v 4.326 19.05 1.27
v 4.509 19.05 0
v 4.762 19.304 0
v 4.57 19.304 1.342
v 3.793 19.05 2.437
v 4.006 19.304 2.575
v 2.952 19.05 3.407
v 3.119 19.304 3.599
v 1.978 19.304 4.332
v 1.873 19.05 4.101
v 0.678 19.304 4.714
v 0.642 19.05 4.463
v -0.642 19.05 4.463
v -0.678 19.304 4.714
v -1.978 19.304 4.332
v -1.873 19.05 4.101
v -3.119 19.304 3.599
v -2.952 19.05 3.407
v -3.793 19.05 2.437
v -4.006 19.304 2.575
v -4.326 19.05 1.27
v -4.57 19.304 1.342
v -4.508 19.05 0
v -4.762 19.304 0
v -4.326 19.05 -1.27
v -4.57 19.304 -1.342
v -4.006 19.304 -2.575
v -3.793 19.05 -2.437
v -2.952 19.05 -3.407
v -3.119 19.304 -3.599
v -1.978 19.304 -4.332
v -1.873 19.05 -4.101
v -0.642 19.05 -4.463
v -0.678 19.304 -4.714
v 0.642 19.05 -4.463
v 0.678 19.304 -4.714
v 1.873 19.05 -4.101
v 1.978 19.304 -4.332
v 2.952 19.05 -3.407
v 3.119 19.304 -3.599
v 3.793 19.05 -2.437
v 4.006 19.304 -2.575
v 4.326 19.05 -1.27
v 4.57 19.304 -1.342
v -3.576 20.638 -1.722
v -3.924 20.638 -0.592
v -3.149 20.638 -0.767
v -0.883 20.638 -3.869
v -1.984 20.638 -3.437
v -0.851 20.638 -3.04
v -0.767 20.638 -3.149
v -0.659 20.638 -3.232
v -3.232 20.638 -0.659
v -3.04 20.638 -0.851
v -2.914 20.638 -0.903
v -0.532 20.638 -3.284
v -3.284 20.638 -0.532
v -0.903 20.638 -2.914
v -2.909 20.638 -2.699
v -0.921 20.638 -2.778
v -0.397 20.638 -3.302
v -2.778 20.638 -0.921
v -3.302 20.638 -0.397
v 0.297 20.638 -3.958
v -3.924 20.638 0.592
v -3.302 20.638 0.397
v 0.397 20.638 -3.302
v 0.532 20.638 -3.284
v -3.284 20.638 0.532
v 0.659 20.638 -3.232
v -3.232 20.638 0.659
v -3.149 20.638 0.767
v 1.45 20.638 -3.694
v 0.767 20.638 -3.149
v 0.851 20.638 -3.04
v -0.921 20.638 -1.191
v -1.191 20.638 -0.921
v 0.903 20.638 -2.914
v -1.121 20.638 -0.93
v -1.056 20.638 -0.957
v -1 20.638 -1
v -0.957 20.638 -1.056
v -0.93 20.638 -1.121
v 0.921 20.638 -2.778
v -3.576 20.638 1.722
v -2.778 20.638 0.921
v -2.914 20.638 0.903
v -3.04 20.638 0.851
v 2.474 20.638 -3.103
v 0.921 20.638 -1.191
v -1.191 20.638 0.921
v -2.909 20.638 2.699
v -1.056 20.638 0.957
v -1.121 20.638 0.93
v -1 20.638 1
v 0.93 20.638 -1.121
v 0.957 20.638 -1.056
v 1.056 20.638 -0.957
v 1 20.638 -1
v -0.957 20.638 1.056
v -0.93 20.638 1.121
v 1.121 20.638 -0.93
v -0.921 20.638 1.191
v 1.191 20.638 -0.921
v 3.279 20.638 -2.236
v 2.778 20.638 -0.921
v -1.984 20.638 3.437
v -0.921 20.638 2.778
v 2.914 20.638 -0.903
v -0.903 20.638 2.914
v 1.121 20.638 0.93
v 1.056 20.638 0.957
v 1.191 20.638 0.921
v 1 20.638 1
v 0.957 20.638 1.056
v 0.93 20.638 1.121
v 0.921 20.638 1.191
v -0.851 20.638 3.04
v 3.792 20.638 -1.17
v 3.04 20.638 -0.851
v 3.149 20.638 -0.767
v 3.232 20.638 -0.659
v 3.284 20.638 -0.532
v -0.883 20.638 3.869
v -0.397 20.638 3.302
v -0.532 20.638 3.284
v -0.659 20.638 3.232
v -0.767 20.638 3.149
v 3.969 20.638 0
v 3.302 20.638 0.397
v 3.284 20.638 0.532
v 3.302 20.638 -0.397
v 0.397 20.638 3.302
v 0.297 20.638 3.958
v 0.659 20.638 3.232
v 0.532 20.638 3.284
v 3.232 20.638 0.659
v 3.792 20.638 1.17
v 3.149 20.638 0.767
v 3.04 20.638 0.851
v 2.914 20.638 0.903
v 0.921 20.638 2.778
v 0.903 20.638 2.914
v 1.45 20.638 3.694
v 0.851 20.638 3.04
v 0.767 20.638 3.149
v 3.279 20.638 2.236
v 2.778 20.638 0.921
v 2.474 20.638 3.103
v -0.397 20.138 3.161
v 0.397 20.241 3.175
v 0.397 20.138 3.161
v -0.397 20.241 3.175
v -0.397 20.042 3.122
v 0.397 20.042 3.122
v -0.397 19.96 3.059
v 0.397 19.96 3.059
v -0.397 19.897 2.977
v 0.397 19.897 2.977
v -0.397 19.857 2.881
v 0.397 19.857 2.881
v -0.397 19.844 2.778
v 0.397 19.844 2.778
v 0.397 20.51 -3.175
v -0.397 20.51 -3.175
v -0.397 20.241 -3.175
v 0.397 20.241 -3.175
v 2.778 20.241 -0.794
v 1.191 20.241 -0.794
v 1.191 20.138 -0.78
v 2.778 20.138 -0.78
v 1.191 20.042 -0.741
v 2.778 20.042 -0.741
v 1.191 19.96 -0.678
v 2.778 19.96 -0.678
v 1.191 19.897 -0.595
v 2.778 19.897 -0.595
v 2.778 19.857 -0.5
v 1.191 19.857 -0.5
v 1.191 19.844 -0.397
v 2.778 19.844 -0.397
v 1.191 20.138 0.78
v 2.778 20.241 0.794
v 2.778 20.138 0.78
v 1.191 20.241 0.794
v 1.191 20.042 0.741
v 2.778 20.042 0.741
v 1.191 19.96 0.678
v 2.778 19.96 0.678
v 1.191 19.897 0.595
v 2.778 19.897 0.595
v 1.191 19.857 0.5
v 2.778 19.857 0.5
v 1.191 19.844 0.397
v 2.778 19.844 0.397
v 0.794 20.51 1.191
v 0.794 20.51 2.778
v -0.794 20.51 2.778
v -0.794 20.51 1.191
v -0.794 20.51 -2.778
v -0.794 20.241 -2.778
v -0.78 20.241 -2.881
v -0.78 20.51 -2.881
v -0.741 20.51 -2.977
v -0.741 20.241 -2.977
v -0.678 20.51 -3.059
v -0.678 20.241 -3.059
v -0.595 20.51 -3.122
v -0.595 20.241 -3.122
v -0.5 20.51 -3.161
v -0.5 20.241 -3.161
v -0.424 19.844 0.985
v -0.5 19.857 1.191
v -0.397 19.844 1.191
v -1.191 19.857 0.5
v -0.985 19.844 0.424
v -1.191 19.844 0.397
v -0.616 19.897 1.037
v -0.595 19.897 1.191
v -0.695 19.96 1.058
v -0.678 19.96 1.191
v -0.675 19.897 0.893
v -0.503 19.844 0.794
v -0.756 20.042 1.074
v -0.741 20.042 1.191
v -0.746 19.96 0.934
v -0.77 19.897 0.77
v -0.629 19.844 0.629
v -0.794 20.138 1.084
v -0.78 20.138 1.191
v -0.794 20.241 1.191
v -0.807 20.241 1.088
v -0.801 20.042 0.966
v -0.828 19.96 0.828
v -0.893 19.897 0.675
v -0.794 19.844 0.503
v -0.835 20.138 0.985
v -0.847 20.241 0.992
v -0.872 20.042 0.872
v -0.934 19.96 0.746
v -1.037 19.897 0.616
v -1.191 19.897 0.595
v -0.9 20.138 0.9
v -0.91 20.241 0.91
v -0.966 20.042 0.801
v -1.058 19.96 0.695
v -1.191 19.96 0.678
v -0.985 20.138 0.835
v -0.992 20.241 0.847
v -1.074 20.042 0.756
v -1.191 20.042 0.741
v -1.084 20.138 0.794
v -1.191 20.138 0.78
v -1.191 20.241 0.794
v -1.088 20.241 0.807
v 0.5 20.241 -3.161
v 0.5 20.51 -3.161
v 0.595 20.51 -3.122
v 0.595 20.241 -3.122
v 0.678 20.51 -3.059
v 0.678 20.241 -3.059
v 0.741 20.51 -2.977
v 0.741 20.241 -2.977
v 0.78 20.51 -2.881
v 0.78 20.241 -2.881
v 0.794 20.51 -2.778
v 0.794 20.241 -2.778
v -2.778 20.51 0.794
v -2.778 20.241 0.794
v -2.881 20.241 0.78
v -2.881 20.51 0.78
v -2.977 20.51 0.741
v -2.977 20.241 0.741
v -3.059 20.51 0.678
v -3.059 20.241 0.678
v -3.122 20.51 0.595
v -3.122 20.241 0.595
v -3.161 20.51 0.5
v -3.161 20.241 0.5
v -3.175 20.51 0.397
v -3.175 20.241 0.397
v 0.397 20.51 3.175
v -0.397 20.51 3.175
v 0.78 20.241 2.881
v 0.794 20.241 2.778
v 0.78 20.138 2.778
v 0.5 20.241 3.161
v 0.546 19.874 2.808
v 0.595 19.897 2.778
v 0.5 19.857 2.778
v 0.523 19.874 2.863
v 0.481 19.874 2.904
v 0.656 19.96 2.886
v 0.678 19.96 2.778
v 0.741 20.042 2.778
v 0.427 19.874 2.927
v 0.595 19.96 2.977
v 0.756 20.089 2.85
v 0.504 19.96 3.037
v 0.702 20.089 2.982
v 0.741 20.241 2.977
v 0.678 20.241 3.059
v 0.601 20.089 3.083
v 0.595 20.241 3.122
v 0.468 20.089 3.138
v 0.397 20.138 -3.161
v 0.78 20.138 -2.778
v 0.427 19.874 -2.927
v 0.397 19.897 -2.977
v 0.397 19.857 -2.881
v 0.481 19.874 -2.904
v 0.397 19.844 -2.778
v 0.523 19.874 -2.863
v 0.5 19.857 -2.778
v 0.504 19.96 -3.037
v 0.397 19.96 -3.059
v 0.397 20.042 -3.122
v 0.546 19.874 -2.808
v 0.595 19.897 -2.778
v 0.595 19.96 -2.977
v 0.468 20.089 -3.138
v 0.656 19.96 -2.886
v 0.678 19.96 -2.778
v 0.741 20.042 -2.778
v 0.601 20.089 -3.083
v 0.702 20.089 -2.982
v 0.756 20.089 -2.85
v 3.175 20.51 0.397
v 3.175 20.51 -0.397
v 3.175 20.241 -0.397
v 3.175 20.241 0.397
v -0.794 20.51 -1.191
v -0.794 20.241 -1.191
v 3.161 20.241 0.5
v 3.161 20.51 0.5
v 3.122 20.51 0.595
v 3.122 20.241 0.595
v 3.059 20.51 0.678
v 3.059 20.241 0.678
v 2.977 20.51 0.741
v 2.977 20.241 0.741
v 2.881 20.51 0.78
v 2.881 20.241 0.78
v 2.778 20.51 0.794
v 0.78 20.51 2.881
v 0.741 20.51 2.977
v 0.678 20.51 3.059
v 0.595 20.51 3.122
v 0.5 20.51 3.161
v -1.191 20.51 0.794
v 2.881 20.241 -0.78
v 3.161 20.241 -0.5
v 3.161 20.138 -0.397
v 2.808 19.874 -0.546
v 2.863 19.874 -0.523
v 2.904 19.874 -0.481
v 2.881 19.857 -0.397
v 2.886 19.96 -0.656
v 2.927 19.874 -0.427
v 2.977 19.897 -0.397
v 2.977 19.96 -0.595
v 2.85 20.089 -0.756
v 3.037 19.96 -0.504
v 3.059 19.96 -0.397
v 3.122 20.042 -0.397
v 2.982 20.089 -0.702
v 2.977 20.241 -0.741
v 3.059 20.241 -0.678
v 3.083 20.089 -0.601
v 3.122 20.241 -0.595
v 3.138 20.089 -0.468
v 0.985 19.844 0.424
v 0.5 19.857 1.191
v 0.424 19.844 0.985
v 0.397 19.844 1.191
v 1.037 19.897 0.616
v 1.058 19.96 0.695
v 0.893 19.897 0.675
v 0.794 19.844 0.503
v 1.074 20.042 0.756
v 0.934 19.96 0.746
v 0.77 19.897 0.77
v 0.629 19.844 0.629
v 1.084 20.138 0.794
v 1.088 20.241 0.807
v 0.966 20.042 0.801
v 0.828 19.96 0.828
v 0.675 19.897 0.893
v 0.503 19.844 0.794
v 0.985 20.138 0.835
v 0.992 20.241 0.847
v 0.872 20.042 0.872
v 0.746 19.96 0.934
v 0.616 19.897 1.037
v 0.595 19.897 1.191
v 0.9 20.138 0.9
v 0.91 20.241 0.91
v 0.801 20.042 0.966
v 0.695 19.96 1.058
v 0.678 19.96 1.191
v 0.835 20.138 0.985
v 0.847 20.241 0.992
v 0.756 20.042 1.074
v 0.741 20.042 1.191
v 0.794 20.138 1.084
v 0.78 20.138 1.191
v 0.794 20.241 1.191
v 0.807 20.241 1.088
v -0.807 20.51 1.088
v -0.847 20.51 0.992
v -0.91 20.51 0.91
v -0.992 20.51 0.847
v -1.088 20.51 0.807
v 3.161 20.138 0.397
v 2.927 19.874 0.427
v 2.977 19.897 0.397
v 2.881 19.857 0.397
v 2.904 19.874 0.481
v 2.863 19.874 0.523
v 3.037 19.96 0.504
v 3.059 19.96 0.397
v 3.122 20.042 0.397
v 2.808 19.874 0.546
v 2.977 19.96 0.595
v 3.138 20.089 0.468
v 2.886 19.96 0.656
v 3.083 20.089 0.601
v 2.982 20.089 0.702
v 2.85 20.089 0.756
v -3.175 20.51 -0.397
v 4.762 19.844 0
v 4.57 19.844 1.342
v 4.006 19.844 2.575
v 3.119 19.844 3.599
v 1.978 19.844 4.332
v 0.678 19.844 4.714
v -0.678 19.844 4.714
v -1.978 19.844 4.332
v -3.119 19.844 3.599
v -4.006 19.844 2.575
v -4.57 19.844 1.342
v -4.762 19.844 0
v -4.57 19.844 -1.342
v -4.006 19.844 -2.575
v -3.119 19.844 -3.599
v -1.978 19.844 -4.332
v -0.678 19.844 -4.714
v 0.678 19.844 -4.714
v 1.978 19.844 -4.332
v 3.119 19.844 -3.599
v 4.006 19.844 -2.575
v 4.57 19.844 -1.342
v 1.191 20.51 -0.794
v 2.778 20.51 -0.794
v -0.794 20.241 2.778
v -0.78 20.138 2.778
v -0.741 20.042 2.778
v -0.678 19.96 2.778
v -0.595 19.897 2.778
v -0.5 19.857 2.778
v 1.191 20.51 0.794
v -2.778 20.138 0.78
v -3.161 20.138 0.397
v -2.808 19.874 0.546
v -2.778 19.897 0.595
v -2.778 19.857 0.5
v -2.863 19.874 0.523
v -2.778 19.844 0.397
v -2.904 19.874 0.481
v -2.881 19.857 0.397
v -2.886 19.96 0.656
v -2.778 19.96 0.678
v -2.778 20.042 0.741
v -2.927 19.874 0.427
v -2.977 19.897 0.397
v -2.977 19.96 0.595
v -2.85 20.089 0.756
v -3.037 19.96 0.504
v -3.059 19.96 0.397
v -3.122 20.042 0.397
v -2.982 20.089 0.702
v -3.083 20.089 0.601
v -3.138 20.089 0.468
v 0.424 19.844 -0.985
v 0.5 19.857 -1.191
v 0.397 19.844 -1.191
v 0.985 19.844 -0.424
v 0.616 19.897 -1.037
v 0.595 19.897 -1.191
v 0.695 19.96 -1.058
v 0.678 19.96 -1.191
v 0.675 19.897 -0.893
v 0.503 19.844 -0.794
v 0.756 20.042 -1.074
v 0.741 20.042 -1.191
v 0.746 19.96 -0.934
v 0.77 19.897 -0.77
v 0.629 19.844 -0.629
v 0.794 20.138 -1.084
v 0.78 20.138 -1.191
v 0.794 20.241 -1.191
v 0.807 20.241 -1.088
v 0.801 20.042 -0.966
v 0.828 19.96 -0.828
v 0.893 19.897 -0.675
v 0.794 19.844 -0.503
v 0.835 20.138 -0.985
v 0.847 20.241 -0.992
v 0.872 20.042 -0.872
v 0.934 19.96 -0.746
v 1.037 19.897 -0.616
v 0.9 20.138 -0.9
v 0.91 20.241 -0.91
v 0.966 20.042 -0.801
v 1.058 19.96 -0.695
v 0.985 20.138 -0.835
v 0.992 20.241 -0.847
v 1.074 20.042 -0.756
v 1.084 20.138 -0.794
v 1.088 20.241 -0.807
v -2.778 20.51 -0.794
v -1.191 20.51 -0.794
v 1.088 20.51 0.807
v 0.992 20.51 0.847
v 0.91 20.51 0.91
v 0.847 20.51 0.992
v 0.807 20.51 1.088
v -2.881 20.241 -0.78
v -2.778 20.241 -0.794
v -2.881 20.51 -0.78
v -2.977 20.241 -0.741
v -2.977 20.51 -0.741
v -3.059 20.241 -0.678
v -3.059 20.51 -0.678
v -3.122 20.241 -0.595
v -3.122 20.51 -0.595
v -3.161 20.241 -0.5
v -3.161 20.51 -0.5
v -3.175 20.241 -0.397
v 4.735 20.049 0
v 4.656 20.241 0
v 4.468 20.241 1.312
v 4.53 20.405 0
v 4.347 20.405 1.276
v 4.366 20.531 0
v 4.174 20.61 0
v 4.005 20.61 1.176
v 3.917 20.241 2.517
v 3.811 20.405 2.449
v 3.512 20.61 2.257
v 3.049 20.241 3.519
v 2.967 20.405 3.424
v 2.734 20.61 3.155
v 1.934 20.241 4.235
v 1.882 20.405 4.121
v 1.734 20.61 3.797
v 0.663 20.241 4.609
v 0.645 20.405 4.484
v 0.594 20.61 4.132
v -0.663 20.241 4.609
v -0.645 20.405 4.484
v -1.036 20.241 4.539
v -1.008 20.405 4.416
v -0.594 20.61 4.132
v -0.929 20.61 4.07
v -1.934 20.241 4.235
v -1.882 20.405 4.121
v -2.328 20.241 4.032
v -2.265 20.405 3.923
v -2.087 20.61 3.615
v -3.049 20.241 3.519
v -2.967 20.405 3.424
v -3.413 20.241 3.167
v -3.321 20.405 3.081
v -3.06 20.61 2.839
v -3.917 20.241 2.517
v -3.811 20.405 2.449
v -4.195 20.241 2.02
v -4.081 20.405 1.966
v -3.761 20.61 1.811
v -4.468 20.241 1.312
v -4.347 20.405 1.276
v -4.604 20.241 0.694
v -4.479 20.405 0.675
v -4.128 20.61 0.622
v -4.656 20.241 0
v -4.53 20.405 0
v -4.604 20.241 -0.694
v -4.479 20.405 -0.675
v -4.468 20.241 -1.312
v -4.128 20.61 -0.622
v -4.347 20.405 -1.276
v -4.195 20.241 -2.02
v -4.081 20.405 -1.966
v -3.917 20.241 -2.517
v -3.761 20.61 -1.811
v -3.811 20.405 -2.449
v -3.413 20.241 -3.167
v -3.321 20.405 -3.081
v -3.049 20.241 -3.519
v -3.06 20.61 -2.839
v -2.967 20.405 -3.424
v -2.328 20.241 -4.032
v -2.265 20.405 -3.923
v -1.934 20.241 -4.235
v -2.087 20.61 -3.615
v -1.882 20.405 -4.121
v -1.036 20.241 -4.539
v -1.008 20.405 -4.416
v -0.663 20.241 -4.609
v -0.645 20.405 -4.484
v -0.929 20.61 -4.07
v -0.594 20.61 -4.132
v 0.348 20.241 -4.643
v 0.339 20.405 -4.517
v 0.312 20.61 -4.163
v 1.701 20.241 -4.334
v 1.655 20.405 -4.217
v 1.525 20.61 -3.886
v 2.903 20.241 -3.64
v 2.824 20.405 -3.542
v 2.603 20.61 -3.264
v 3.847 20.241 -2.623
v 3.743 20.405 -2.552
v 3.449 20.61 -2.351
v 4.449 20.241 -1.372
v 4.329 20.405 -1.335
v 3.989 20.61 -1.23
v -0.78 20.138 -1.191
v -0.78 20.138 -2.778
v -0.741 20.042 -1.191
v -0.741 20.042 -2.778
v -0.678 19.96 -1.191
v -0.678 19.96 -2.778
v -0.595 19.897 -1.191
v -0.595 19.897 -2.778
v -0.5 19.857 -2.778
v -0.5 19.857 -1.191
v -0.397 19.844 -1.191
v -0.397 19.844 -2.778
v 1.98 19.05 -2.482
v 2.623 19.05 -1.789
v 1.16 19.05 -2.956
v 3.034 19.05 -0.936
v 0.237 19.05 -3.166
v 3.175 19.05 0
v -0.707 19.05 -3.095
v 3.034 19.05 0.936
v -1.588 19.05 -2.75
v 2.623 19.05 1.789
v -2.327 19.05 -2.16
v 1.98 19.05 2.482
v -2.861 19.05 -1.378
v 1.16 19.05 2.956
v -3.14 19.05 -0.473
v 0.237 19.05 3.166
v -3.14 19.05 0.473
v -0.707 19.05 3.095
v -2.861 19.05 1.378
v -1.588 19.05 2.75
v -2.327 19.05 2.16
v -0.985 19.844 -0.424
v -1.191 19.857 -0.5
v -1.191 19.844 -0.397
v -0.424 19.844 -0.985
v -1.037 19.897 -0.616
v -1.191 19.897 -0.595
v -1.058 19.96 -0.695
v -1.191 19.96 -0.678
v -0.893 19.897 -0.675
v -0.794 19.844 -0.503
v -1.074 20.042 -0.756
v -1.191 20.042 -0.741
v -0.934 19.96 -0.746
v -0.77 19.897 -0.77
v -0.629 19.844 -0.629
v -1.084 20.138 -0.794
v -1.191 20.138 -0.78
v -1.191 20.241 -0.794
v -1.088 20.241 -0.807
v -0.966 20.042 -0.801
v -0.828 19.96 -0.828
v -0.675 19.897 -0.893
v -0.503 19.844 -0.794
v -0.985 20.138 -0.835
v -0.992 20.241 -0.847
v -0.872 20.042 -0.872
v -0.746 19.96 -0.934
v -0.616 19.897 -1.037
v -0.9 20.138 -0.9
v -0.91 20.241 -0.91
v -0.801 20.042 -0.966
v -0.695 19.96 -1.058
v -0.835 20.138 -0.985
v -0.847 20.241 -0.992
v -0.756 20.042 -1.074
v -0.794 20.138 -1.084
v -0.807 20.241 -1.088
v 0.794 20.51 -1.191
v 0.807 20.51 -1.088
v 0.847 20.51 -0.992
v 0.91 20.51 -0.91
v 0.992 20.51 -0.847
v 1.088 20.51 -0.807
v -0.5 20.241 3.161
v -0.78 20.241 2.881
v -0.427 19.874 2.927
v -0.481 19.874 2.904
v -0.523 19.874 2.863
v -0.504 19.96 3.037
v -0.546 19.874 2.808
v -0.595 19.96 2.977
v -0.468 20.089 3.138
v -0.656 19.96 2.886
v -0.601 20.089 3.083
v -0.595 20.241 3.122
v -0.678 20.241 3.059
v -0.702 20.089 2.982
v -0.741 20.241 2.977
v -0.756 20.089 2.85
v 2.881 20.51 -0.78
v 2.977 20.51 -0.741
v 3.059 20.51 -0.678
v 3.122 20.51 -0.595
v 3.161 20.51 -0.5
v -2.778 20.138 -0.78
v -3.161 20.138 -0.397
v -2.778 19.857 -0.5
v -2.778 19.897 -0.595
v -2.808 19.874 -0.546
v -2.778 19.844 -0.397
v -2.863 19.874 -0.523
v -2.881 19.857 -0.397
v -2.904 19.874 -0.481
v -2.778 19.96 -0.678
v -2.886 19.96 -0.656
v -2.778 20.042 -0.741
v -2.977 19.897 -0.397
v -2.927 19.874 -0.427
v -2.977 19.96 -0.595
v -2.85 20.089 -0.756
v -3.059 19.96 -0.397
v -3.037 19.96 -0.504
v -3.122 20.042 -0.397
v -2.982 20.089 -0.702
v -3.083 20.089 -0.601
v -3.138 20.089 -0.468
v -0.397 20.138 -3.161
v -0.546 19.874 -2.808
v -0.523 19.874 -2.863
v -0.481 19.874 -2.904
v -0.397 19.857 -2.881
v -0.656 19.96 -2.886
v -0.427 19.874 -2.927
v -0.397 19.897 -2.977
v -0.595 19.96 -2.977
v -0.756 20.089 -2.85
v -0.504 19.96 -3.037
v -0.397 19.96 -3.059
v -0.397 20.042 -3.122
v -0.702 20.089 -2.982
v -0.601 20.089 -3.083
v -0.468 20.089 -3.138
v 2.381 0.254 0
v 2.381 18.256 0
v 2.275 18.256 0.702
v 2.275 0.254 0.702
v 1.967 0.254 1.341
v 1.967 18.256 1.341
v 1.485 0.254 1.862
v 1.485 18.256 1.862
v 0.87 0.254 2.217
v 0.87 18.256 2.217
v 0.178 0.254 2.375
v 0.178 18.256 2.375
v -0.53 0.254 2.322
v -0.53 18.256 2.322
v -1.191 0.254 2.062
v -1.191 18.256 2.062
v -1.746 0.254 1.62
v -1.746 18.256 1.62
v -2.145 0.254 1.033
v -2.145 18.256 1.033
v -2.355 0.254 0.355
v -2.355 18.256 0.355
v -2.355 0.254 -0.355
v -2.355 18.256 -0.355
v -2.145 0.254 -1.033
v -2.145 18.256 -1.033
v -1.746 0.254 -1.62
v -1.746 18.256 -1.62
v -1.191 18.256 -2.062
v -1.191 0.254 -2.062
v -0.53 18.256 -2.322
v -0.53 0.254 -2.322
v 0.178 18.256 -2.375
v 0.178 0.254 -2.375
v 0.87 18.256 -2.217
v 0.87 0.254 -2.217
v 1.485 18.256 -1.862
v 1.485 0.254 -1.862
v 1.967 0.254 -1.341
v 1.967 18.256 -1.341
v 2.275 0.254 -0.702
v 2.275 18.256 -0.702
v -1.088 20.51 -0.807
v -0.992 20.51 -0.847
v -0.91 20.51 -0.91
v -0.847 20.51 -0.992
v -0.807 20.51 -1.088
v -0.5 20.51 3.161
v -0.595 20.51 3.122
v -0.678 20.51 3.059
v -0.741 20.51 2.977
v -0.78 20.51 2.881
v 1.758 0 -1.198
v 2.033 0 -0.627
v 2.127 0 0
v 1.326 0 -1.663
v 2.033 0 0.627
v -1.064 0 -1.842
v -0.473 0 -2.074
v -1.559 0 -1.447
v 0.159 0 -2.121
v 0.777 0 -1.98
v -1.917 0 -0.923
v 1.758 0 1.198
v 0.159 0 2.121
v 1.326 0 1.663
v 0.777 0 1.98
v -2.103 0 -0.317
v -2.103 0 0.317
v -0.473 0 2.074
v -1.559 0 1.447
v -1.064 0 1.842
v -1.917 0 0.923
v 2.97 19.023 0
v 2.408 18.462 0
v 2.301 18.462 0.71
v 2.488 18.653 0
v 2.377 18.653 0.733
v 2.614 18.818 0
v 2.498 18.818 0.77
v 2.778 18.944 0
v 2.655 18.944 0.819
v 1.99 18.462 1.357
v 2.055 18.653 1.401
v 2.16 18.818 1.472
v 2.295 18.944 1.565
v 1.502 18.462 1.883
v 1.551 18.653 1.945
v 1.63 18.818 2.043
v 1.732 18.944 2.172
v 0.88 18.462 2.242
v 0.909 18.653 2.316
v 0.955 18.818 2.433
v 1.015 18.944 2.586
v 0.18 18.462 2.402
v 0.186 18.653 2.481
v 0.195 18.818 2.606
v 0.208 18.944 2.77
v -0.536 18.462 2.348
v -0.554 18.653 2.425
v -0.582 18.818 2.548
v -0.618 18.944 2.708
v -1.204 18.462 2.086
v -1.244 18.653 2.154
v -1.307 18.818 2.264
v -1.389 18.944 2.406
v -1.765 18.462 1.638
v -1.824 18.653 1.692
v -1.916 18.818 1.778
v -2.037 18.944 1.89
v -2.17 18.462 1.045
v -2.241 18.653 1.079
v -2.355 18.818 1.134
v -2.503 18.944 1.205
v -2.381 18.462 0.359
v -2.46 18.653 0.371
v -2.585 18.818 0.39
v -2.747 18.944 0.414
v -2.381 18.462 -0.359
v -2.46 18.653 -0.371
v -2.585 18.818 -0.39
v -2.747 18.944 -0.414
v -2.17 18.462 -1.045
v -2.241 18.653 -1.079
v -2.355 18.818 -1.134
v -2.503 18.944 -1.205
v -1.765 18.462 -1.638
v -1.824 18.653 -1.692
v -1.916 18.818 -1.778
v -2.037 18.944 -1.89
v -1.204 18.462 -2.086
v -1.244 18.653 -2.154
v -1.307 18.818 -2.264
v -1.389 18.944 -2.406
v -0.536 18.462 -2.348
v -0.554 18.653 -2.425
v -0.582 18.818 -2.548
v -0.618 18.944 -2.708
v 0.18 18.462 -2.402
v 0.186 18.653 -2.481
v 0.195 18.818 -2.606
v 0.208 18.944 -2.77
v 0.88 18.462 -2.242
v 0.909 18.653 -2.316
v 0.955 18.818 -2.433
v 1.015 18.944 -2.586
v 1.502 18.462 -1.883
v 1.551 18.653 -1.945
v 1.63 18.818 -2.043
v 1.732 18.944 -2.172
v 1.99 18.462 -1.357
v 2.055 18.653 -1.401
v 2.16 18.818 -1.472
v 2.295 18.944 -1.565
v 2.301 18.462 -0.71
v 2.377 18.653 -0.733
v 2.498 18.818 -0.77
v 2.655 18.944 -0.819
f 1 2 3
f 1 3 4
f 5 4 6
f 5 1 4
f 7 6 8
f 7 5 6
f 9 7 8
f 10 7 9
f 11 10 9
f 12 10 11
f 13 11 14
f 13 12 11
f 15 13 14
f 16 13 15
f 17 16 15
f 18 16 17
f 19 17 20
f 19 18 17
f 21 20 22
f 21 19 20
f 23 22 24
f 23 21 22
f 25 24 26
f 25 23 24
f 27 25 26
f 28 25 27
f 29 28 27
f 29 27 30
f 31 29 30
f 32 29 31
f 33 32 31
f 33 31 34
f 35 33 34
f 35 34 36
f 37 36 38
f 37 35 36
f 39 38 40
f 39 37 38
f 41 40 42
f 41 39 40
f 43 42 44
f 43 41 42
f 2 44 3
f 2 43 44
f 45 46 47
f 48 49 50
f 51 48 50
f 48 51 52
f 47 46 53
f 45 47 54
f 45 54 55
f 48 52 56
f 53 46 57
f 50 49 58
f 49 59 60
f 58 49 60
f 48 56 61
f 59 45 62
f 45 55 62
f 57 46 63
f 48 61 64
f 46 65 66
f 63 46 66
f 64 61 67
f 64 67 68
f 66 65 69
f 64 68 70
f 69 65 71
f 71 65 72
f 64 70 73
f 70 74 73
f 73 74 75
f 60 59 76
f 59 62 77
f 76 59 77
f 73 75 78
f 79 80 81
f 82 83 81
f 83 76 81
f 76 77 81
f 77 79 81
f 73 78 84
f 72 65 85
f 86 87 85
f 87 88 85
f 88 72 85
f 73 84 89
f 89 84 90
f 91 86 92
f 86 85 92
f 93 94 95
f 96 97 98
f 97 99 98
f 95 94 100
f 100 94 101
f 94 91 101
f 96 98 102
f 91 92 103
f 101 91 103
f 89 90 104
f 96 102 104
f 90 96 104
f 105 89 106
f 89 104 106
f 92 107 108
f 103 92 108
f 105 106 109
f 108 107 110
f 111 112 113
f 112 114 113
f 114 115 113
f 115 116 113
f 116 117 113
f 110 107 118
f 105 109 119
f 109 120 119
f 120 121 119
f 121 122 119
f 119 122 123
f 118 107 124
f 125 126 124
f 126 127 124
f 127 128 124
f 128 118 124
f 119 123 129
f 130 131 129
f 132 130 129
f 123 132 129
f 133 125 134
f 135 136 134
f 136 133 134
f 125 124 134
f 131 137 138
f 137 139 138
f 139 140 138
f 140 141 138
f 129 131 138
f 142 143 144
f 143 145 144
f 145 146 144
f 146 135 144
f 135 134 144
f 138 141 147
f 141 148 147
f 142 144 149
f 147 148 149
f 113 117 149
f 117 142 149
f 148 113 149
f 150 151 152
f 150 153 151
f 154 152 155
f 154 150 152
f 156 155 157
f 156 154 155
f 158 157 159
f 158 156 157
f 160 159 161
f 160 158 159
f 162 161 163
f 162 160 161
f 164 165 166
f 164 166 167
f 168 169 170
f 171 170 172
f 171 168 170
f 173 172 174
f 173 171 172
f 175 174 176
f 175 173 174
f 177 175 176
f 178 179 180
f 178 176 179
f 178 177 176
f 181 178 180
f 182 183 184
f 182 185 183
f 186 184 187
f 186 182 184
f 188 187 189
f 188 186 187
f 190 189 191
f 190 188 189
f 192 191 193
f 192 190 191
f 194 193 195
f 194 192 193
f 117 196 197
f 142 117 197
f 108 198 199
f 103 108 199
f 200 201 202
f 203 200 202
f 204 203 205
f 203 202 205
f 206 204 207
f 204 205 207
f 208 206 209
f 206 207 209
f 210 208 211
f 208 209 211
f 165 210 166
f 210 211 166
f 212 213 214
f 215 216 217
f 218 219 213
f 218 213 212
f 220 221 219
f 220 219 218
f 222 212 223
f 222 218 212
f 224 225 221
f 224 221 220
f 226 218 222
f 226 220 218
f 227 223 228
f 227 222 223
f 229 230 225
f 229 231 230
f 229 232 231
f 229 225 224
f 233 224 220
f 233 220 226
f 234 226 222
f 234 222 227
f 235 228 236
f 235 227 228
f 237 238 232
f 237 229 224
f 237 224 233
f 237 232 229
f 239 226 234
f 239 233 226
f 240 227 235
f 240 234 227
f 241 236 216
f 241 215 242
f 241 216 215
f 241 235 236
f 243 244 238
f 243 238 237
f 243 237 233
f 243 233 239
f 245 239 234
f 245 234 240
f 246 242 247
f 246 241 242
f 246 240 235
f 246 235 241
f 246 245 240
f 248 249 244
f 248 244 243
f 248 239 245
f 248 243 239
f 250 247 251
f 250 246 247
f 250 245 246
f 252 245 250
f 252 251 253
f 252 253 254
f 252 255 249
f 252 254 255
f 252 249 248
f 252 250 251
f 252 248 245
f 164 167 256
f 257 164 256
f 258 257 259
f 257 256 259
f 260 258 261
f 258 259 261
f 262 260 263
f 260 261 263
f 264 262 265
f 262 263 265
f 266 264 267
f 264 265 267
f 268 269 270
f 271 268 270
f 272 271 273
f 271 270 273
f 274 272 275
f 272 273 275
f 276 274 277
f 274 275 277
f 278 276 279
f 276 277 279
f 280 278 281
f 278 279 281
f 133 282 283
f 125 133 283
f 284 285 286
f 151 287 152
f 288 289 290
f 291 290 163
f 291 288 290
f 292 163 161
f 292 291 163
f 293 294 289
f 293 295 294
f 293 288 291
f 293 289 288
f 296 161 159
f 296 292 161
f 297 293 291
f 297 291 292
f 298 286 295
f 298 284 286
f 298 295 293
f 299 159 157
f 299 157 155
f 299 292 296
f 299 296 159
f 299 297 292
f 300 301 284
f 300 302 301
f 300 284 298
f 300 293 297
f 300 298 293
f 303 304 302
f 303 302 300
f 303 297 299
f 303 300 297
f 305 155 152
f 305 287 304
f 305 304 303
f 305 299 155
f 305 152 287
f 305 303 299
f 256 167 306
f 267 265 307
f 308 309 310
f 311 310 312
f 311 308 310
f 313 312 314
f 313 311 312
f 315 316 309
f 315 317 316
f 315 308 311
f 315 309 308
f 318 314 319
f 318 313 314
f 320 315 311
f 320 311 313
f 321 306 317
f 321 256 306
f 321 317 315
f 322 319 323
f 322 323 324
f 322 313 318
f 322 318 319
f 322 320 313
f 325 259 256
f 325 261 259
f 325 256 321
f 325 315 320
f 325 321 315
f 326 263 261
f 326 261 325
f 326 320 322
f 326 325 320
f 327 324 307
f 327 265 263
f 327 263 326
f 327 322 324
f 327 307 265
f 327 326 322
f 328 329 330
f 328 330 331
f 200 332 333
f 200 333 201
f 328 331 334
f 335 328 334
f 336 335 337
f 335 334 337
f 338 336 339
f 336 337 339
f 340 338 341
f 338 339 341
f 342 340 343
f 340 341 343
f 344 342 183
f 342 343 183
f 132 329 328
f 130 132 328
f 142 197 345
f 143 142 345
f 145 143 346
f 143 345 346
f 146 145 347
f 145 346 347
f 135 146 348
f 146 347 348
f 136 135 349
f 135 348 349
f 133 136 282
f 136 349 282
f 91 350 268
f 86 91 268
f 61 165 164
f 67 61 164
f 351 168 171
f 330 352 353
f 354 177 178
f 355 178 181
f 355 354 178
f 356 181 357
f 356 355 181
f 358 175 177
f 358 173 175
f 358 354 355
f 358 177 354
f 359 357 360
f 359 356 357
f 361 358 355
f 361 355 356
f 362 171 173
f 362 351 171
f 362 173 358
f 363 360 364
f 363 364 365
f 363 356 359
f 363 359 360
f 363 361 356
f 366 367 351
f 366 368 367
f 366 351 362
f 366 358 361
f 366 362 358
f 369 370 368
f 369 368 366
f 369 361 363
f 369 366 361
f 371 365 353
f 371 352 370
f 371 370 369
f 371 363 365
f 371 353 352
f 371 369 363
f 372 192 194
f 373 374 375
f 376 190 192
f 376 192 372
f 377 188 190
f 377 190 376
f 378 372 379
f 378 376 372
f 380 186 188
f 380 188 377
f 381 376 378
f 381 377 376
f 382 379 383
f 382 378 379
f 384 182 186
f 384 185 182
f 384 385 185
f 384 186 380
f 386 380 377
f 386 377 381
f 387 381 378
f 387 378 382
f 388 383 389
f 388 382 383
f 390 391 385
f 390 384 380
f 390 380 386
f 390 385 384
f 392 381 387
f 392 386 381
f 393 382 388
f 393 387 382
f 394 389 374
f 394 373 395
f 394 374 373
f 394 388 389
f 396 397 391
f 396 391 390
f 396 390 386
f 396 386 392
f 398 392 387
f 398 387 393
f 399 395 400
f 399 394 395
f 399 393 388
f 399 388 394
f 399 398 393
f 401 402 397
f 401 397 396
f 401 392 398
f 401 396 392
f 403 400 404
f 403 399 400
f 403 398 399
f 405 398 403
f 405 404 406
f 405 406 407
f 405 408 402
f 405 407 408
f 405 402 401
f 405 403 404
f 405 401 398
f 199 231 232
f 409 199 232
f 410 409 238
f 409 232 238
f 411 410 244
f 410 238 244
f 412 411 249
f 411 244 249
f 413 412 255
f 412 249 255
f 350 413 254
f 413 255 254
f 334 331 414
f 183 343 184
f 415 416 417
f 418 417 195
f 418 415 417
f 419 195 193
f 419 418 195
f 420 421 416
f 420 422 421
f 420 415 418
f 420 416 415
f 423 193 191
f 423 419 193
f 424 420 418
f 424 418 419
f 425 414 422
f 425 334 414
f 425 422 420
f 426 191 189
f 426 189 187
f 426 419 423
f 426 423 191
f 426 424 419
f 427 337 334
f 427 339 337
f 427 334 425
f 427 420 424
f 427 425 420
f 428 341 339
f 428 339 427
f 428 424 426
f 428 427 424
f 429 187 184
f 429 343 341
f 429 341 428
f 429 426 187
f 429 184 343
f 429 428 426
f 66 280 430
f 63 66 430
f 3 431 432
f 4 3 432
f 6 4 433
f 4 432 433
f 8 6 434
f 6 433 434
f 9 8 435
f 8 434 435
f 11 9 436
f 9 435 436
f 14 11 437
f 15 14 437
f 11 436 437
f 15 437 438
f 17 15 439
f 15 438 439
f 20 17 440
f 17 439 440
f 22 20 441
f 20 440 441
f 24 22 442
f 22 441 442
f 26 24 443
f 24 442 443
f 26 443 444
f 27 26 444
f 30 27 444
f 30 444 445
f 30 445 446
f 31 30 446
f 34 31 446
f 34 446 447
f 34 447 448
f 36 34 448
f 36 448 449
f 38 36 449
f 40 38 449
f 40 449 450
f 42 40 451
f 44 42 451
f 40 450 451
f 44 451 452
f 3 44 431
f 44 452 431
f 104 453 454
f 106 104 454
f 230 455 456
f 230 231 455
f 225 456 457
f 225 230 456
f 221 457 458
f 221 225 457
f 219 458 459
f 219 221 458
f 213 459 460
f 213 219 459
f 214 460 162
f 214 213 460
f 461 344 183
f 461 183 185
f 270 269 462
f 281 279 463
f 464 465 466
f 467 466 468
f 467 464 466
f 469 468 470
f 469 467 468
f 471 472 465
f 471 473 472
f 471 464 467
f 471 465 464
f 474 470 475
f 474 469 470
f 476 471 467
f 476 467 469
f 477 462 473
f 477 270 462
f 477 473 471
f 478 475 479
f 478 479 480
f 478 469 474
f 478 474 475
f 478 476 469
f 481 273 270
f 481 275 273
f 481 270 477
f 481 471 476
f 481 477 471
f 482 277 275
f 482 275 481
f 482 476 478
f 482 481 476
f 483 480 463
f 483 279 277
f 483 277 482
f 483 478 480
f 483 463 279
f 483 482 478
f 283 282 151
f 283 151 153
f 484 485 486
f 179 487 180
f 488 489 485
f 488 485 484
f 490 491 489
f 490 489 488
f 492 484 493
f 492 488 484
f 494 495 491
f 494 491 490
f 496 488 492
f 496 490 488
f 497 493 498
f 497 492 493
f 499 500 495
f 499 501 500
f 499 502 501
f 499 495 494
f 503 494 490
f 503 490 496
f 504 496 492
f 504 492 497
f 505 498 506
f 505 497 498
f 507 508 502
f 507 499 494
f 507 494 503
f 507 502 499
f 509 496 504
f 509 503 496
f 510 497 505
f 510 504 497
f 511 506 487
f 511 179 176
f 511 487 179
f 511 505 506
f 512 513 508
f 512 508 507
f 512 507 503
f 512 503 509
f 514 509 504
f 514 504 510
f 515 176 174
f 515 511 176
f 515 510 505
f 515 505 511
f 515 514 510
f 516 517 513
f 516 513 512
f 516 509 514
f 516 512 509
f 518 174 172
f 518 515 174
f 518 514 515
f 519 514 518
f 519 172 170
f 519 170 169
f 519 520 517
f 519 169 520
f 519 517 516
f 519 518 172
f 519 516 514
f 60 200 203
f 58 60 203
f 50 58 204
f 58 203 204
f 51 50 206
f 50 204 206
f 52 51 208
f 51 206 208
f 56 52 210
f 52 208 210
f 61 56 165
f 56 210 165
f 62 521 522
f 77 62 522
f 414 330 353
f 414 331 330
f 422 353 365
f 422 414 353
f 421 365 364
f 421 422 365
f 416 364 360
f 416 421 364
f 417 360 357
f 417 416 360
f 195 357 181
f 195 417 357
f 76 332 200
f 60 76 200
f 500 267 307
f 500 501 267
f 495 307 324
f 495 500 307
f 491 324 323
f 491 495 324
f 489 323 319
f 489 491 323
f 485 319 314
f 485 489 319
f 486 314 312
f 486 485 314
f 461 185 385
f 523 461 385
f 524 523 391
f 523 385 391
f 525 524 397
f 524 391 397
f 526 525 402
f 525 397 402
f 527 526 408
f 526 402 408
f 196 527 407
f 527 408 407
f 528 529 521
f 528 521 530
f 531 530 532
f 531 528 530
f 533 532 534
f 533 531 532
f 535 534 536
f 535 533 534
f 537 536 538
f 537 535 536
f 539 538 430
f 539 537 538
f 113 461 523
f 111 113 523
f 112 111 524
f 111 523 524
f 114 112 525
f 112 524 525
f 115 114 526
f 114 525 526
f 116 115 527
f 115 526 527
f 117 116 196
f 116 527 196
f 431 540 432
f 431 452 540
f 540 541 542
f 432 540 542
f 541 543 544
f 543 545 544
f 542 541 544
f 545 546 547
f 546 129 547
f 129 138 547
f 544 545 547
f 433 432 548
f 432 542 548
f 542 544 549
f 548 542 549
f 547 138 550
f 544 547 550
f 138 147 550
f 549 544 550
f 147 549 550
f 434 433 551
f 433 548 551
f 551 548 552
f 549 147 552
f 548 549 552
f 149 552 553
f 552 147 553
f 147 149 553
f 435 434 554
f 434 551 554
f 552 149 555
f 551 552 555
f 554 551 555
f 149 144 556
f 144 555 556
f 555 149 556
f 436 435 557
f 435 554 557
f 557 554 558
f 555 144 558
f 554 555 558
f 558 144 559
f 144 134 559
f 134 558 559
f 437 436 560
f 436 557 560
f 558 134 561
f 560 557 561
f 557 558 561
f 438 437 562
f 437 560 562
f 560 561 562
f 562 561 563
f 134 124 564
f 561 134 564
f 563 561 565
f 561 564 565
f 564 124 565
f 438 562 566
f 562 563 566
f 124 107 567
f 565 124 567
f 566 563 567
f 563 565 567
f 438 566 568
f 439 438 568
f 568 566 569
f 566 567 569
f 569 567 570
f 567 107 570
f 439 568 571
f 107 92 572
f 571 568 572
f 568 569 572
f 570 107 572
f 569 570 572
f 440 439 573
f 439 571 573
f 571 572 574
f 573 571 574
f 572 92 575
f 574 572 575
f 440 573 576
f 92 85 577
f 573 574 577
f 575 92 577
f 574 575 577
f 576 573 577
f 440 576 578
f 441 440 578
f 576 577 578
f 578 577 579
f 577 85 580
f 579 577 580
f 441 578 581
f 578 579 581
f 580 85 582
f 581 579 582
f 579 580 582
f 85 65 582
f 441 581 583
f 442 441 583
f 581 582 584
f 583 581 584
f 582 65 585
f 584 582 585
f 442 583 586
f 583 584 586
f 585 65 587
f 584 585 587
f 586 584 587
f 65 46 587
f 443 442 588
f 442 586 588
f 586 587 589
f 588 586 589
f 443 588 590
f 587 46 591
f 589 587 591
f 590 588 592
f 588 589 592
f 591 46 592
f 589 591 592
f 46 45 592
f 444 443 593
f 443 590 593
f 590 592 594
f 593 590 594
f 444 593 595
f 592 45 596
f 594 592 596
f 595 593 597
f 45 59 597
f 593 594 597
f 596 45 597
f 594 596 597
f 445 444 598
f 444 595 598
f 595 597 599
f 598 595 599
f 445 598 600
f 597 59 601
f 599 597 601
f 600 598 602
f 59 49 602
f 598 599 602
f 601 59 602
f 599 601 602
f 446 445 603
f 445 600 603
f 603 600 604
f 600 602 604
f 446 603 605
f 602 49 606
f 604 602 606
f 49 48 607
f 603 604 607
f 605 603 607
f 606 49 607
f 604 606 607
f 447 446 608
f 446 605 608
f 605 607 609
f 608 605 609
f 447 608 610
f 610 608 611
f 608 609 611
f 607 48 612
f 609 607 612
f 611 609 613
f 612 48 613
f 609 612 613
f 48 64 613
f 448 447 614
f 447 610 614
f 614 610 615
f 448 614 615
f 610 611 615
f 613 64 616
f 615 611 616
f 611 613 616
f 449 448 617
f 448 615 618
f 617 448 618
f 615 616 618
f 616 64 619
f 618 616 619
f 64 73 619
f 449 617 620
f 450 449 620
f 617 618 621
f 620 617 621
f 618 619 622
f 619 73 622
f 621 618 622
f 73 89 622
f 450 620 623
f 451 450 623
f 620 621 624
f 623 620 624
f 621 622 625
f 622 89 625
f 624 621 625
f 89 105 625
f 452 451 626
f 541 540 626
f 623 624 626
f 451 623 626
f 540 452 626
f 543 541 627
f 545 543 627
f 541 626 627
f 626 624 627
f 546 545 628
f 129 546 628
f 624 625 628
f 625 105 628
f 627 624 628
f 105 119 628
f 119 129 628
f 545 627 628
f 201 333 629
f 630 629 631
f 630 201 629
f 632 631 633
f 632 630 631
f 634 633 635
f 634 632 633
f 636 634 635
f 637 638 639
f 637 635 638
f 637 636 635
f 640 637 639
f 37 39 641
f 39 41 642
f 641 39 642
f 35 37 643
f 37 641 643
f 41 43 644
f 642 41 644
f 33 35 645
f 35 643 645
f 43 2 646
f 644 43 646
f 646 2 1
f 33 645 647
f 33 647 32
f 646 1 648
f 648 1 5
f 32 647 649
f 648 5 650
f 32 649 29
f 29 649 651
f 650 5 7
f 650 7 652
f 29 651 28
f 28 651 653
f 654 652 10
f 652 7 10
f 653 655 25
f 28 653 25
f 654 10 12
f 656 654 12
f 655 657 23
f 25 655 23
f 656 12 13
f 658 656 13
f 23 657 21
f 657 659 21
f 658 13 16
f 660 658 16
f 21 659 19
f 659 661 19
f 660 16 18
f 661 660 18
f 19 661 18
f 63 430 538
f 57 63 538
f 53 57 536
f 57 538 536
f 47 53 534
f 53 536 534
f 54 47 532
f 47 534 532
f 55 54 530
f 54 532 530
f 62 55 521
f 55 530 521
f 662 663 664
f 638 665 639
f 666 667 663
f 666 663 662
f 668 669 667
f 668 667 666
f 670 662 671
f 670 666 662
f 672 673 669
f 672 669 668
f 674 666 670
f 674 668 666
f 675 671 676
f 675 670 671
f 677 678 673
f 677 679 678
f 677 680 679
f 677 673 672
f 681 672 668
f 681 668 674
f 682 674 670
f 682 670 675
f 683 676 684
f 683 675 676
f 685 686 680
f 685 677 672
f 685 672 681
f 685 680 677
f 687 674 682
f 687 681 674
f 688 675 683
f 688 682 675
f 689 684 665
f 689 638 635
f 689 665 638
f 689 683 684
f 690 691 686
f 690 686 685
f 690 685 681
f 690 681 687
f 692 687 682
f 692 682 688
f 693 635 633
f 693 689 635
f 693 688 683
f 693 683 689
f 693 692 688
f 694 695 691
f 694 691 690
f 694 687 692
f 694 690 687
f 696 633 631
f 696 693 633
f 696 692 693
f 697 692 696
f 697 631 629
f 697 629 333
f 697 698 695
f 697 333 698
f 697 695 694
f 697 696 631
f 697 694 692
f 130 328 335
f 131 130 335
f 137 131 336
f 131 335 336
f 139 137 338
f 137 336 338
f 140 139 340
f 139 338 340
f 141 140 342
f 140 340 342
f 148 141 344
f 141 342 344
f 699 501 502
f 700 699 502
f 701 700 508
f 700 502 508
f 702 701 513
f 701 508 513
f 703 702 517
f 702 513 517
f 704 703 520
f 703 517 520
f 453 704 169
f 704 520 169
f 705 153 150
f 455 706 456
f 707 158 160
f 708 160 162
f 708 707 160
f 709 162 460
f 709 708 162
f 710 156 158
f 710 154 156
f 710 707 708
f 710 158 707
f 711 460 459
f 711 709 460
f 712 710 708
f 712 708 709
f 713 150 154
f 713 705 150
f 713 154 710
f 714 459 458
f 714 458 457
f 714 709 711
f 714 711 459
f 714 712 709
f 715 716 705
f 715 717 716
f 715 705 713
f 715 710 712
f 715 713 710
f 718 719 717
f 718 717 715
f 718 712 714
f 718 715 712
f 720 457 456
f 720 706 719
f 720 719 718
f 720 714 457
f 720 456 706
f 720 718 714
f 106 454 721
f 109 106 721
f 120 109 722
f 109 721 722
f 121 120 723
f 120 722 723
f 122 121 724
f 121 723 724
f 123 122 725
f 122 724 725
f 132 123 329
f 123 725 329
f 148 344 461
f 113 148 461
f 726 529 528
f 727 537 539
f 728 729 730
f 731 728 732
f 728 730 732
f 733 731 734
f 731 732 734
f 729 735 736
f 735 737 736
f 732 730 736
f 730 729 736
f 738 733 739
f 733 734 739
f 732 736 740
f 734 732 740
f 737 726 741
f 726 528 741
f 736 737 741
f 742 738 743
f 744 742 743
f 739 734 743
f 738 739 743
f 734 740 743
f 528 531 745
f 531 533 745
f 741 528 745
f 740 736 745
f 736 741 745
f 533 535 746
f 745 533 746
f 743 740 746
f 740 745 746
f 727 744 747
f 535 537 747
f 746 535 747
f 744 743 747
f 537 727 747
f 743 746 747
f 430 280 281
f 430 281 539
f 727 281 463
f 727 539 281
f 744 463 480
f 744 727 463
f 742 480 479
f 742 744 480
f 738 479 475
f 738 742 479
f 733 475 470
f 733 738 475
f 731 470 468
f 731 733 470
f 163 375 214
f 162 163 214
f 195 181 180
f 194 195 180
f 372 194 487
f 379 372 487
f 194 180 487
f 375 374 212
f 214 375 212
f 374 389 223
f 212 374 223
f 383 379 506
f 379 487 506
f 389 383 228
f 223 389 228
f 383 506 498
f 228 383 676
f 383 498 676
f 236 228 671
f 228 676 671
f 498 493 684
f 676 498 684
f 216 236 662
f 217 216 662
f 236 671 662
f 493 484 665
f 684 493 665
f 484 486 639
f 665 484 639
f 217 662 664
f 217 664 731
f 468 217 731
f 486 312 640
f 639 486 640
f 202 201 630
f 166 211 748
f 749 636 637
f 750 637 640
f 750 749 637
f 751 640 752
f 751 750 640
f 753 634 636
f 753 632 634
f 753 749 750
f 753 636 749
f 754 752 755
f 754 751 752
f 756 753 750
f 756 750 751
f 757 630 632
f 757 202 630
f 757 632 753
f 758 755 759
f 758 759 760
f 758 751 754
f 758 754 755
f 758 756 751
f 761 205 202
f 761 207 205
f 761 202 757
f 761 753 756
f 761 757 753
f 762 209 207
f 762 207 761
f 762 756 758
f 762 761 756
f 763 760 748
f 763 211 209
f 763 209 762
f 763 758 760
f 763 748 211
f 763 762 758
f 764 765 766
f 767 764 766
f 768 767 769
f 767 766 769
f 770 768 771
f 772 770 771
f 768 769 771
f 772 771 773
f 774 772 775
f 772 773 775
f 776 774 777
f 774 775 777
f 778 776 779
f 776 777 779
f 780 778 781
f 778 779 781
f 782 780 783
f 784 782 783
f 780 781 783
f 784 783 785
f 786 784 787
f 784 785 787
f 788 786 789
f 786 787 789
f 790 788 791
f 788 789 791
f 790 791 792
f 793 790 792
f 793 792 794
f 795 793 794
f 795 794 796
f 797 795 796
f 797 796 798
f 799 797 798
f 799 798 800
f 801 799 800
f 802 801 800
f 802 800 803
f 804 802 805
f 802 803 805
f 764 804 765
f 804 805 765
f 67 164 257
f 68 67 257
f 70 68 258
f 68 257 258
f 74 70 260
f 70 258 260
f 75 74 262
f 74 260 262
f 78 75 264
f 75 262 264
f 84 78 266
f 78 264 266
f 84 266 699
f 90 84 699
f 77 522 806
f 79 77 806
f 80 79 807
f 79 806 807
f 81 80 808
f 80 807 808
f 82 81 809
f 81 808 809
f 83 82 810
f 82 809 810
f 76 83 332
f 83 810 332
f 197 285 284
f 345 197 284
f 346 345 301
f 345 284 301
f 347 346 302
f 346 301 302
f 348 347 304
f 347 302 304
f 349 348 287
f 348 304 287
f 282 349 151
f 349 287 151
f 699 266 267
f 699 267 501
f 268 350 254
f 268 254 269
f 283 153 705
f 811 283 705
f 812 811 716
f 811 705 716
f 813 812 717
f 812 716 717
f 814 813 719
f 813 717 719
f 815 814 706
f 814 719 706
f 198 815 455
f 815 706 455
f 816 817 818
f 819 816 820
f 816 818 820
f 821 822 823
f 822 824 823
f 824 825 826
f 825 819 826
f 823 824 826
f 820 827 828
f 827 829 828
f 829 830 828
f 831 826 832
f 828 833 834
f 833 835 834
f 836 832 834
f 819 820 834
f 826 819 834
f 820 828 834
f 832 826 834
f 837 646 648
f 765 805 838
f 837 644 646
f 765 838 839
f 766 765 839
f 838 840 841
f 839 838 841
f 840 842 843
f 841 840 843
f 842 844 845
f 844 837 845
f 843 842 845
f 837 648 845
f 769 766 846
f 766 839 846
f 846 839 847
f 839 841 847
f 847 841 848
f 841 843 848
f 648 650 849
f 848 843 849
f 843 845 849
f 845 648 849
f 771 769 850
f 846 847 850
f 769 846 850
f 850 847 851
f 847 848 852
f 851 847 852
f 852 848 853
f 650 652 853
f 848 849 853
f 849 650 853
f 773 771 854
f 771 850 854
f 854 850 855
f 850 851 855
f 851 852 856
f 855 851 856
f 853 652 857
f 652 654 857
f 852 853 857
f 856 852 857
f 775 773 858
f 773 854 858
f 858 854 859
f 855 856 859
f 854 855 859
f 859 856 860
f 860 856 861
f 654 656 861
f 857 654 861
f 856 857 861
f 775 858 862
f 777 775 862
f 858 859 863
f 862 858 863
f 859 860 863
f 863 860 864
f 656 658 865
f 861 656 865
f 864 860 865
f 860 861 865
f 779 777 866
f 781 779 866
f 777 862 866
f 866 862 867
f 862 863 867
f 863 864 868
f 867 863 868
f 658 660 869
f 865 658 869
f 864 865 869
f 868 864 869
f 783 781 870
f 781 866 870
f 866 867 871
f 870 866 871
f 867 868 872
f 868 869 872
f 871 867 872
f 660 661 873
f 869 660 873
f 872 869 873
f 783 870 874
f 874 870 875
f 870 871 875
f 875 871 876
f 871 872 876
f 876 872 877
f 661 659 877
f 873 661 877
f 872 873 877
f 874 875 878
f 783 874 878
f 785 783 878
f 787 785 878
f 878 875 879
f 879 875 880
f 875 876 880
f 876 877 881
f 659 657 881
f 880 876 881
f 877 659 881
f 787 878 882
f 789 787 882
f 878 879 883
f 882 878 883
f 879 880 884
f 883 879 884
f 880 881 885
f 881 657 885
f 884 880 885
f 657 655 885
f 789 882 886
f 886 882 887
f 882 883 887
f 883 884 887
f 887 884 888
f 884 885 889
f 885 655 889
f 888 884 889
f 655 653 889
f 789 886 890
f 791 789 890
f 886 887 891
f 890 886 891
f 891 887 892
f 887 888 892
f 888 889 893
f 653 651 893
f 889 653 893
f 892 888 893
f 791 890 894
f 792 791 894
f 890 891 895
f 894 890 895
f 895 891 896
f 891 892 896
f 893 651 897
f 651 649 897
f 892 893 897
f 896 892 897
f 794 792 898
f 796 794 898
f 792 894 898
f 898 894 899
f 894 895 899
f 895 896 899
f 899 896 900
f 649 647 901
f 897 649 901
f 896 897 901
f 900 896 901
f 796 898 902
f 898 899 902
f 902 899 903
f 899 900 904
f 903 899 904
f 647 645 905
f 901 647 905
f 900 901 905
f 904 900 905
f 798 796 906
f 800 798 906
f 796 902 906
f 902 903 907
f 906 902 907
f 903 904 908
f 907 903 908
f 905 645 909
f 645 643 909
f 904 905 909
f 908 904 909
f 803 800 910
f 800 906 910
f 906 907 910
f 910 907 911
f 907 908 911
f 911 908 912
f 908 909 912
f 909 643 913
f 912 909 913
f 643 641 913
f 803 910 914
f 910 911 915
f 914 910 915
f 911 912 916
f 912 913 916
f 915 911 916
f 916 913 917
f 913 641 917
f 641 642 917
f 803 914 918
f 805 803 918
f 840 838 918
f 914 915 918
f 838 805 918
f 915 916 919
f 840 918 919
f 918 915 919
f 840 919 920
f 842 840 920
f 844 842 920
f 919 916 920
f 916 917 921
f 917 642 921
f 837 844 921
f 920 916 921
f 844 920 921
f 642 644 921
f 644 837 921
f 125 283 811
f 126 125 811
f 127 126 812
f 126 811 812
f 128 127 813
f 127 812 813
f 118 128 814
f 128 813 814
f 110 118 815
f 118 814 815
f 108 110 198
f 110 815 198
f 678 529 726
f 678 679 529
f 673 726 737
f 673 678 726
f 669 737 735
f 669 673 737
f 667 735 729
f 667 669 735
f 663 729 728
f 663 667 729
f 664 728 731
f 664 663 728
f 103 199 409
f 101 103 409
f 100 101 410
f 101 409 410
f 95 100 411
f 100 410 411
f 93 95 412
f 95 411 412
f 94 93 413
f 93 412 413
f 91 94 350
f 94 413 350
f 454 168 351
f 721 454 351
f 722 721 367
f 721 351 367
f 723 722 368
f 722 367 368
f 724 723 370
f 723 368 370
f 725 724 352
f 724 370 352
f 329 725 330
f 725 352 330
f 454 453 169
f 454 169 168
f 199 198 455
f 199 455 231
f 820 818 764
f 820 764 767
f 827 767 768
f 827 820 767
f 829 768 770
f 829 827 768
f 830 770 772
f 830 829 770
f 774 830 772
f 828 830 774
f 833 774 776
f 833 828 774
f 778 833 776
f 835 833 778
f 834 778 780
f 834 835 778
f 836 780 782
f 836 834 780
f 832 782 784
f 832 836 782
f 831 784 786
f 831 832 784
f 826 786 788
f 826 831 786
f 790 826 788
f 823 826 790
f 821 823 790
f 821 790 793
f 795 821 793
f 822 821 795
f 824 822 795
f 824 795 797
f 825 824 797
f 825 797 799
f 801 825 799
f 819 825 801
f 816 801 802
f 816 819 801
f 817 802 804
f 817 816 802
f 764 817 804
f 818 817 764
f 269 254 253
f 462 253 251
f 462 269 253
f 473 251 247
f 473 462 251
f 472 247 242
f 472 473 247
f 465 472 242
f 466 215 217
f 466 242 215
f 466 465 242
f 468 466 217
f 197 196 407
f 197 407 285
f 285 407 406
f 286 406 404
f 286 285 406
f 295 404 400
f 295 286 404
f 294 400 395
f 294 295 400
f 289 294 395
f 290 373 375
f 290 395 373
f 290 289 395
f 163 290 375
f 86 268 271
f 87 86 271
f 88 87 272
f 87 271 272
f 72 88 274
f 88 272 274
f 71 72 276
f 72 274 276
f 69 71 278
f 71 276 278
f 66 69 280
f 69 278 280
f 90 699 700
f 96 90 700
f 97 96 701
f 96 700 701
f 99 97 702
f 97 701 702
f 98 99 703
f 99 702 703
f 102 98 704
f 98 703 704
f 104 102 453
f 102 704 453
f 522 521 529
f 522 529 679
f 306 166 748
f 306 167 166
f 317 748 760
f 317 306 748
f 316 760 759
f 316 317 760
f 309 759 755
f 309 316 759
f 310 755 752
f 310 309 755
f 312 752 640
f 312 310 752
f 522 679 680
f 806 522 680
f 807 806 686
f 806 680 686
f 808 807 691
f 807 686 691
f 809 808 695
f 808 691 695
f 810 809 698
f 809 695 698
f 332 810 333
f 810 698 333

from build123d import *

# Parameters (mm, degrees)
CUT_EXTRUDE1_DEPTH = 0.79375
FILLET2_R          = 0.79375
FILLET3_R          = 0.396875
CHAMFER1_SIZE      = 0.254
CHAMFER2_SIZE      = 0.127


with BuildPart() as part:
    # Sketch1 → Revolve1 (revolve)
    with BuildSketch(Plane.XY):
        Polygon((0, 0), (2.38125, 0), (2.38125, 19.05), (4.7625, 19.05), (4.7625, 20.6375), (0, 20.6375), align=None)
    revolve(axis=Axis((0, 5.173549107, 0), (0, -1, 0)))

    # Sketch2 → Cut-Extrude1 (cut)
    with BuildSketch(Plane(origin=(0, 20.6375, 0), x_dir=(1, 0, 0), z_dir=(0, 1, 0))):
        Polygon((-3.175, 0.79375), (-0.79375, 0.79375), (-0.79375, 3.175), (0.79375, 3.175), (0.79375, 0.79375), (3.175, 0.79375), (3.175, -0.79375), (0.79375, -0.79375), (0.79375, -3.175), (-0.79375, -3.175), (-0.79375, -0.79375), (-3.175, -0.79375), align=None)
    extrude(amount=-CUT_EXTRUDE1_DEPTH, mode=Mode.SUBTRACT)

    # Fillet2
    fillet2_edges = [part.edges().sort_by_distance(p)[0] for p in [
        (-4.7625, 20.6375, 0),
        (-2.38125, 19.05, 0),
    ]]
    fillet(fillet2_edges, radius=FILLET2_R)

    # Fillet3
    fillet3_edges = [part.edges().sort_by_distance(p)[0] for p in [
        (-3.175, 20.240625, -0.79375),
        (-0.79375, 20.240625, -0.79375),
        (-0.79375, 20.240625, -3.175),
        (0.79375, 20.240625, -3.175),
        (0.79375, 20.240625, -0.79375),
        (3.175, 20.240625, -0.79375),
        (3.175, 20.240625, 0.79375),
        (0.79375, 20.240625, 0.79375),
        (0.79375, 20.240625, 3.175),
        (-0.79375, 20.240625, 3.175),
        (-0.79375, 20.240625, 0.79375),
        (-3.175, 20.240625, 0.79375),
        (-1.984375, 19.84375, -0.79375),
        (-0.79375, 19.84375, -1.984375),
        (0, 19.84375, -3.175),
        (0.79375, 19.84375, -1.984375),
        (1.984375, 19.84375, -0.79375),
        (3.175, 19.84375, 0),
        (1.984375, 19.84375, 0.79375),
        (0.79375, 19.84375, 1.984375),
        (0, 19.84375, 3.175),
        (-0.79375, 19.84375, 1.984375),
        (-1.984375, 19.84375, 0.79375),
        (-3.175, 19.84375, 0),
    ]]
    fillet(fillet3_edges, radius=FILLET3_R)

    # Chamfer1
    chamfer1_edges = [part.edges().sort_by_distance(p)[0] for p in [
        (-4.7625, 19.05, 0),
        (-2.38125, 0, 0),
    ]]
    chamfer(chamfer1_edges, length=CHAMFER1_SIZE)

    # Chamfer2
    chamfer2_edges = [part.edges().sort_by_distance(p)[0] for p in [
        (-1.984375, 20.6375, -0.79375),
        (-0.79375, 20.6375, -1.984375),
        (0, 20.6375, -3.175),
        (0.79375, 20.6375, -1.984375),
        (1.984375, 20.6375, -0.79375),
        (3.175, 20.6375, 0),
        (1.984375, 20.6375, 0.79375),
        (0.79375, 20.6375, 1.984375),
        (0, 20.6375, 3.175),
        (-0.79375, 20.6375, 1.984375),
        (-1.984375, 20.6375, 0.79375),
        (-3.175, 20.6375, 0),
        (-0.909991996, 20.6375, -0.909991996),
        (0.909991996, 20.6375, -0.909991996),
        (0.909991996, 20.6375, 0.909991996),
        (-0.909991996, 20.6375, 0.909991996),
        (-3.058758004, 20.6375, -0.677508004),
        (-3.058758004, 20.6375, 0.677508004),
        (-0.677508004, 20.6375, 3.058758004),
        (0.677508004, 20.6375, 3.058758004),
        (3.058758004, 20.6375, 0.677508004),
        (3.058758004, 20.6375, -0.677508004),
        (-0.677508004, 20.6375, -3.058758004),
        (0.677508004, 20.6375, -3.058758004),
    ]]
    chamfer(chamfer2_edges, length=CHAMFER2_SIZE)


solid = part.part
